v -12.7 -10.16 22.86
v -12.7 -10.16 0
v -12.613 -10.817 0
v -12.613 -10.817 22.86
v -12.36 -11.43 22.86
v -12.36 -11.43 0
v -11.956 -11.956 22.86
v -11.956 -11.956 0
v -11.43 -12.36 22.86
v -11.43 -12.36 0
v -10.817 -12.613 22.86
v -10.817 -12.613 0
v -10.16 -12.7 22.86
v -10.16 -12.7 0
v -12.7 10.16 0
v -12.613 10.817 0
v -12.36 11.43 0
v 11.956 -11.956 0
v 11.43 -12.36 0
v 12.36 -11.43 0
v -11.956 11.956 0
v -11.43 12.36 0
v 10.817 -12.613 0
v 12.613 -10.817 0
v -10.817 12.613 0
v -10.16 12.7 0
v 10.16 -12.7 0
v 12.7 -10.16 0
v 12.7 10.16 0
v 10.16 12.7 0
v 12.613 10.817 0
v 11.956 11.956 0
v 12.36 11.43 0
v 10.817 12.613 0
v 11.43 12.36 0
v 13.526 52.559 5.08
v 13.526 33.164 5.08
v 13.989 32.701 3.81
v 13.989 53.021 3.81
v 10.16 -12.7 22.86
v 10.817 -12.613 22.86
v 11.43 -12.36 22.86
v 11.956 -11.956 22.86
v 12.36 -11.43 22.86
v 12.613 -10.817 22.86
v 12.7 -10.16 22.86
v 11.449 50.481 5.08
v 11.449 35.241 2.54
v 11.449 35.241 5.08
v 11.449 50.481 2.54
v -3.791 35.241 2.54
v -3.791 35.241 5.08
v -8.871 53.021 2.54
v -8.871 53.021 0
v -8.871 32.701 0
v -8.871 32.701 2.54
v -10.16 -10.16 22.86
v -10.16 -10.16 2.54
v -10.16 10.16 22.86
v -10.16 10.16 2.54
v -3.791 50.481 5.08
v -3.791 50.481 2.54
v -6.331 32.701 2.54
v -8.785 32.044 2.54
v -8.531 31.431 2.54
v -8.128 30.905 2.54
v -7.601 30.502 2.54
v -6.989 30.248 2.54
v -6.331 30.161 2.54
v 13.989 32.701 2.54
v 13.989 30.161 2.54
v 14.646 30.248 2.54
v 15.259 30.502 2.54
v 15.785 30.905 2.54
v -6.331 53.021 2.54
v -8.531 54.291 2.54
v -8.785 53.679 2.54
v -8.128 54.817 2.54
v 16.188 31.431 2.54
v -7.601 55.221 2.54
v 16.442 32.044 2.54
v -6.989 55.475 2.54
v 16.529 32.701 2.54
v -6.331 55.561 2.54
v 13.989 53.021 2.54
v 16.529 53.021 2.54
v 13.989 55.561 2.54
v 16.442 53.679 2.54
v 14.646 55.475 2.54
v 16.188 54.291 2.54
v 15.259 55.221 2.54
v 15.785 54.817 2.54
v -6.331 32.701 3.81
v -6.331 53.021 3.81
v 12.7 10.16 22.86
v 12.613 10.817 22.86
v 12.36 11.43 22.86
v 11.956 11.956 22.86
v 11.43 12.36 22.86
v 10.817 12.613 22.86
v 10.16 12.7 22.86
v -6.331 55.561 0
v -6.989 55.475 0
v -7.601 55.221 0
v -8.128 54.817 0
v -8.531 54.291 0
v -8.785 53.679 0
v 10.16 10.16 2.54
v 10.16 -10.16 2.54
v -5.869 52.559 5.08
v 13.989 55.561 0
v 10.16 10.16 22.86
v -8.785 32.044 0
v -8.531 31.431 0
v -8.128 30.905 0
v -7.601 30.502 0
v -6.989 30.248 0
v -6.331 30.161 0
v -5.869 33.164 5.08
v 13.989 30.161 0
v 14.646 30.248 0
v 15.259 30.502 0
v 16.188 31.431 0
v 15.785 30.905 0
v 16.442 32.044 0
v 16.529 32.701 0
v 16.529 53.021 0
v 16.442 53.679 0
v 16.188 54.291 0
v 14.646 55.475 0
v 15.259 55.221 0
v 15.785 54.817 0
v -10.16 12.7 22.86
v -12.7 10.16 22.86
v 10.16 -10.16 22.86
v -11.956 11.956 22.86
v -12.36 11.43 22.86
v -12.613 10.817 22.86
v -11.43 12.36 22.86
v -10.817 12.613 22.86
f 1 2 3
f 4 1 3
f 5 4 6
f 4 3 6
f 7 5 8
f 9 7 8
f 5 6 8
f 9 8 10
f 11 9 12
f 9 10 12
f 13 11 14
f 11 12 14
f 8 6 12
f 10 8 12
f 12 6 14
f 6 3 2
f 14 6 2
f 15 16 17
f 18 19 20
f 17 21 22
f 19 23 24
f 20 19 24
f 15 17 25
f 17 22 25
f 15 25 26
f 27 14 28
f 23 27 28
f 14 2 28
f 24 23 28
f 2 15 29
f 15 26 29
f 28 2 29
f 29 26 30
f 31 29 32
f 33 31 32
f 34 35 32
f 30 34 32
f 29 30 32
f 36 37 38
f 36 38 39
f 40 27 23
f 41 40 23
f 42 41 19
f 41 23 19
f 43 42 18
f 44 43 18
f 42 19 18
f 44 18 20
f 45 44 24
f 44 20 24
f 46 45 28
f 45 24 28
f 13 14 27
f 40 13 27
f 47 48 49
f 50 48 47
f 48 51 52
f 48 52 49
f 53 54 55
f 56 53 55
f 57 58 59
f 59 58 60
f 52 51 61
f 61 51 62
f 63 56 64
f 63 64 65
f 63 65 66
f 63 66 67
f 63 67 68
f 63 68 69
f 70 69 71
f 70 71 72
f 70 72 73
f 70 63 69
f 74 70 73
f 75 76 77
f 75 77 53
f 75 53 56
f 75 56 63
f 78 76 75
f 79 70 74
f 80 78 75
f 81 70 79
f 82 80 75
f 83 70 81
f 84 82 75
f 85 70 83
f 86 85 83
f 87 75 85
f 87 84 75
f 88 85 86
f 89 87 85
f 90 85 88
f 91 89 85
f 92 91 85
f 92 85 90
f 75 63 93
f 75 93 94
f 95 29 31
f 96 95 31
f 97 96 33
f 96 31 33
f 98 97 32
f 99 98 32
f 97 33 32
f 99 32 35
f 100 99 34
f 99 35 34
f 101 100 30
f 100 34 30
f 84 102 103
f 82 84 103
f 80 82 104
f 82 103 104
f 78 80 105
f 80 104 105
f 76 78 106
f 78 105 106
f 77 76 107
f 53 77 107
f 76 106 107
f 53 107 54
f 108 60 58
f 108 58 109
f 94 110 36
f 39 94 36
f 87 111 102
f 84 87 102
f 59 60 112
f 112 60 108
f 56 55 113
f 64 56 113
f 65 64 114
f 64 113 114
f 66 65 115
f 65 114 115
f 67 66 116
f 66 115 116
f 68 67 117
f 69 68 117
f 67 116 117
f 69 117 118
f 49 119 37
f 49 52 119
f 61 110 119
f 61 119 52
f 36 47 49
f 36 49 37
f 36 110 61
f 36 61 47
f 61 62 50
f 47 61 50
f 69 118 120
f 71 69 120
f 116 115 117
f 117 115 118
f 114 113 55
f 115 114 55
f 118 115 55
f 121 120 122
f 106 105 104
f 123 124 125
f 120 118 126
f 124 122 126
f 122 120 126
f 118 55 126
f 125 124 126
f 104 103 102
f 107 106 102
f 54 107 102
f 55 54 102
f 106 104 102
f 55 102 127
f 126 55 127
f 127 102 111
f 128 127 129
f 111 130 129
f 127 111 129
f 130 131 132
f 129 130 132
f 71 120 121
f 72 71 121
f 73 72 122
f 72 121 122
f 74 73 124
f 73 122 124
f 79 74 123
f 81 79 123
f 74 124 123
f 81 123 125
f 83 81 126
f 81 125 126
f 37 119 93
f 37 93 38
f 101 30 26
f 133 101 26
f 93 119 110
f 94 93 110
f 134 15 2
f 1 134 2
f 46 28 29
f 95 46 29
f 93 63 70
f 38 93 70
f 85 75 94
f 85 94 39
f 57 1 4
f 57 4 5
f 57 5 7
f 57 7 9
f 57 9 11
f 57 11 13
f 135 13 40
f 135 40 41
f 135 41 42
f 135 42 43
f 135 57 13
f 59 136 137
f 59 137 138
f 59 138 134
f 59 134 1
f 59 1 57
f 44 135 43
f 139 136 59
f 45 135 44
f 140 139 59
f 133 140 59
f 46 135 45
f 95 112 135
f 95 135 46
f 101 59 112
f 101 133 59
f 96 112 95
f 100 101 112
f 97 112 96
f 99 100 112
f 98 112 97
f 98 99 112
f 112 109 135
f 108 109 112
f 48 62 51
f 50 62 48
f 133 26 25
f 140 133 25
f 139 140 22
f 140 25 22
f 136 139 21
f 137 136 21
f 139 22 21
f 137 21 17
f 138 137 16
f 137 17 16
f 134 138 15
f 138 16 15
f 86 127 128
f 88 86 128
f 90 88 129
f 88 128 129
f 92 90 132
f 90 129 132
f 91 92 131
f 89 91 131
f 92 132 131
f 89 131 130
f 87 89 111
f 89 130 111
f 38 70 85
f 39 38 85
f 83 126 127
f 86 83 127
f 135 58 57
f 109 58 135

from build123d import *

# Parameters (mm, degrees)
F0_W     = 20.32
F0_H     = 20.32
F1_DEPTH = 22.86
F2_DEPTH = 2.54
F3_DEPTH = 2.54
F0_W_2   = 15.24
F0_H_2   = 15.24
F4_DEPTH = 5.08
F5_DEPTH = 2.54
F6_SIZE2 = 0.462242
F6_SIZE  = 1.27


with BuildPart() as f1:
    # F0 (on Top) → F1 (new body)
    with BuildSketch(Plane.XY):
        with BuildLine():
            Line((10.16, 12.7), (-10.16, 12.7))
            ThreePointArc((-10.16, 12.7), (-11.956051, 11.956051), (-12.7, 10.16))
            Line((-12.7, 10.16), (-12.7, -10.16))
            ThreePointArc((-12.7, -10.16), (-11.956051, -11.956051), (-10.16, -12.7))
            Line((-10.16, -12.7), (10.16, -12.7))
            ThreePointArc((10.16, -12.7), (11.956051, -11.956051), (12.7, -10.16))
            Line((12.7, -10.16), (12.7, 10.16))
            ThreePointArc((12.7, 10.16), (11.956051, 11.956051), (10.16, 12.7))
        make_face()
        Rectangle(F0_W, F0_H, mode=Mode.SUBTRACT)
    extrude(amount=F1_DEPTH)

    # F0 (on Top) → F2 (join)
    with BuildSketch(Plane.XY):
        Rectangle(F0_W, F0_H)
    extrude(amount=F2_DEPTH)


with BuildPart() as f3:
    # F0 (on Top) → F3 (new body)
    with BuildSketch(Plane.XY):
        with BuildLine():
            Line((13.988516, 55.561309), (-6.331484, 55.561309))
            ThreePointArc((-6.331484, 55.561309), (-8.127535, 54.81736), (-8.871484, 53.021309))
            Line((-8.871484, 53.021309), (-8.871484, 32.701309))
            ThreePointArc((-8.871484, 32.701309), (-8.127535, 30.905258), (-6.331484, 30.161309))
            Line((-6.331484, 30.161309), (13.988516, 30.161309))
            ThreePointArc((13.988516, 30.161309), (15.784567, 30.905258), (16.528516, 32.701309))
            Line((16.528516, 32.701309), (16.528516, 53.021309))
            ThreePointArc((16.528516, 53.021309), (15.784567, 54.81736), (13.988516, 55.561309))
        make_face()
        with Locations((3.828516, 42.861309)):
            Rectangle(F0_W, F0_H, mode=Mode.SUBTRACT)
    extrude(amount=F3_DEPTH)

    # F0 (on Top) → F4 (join)
    with BuildSketch(Plane.XY):
        with Locations((3.828516, 42.861309)):
            Rectangle(F0_W, F0_H)
        with Locations((3.828516, 42.861309)):
            Rectangle(F0_W_2, F0_H_2, mode=Mode.SUBTRACT)
    extrude(amount=F4_DEPTH)

    # F0 (on Top) → F5 (join)
    with BuildSketch(Plane.XY):
        with Locations((3.828516, 42.861309)):
            Rectangle(F0_W_2, F0_H_2)
    extrude(amount=F5_DEPTH)

    # F6
    f6_edges = [f3.edges().sort_by_distance(p)[0] for p in [
        (13.988516, 42.861309, 5.08),
        (3.828516, 32.701309, 5.08),
        (3.828516, 53.021309, 5.08),
        (-6.331484, 42.861309, 5.08),
    ]]
    chamfer(f6_edges, length=F6_SIZE, length2=F6_SIZE2)


solid = Compound([f1.part, f3.part])
